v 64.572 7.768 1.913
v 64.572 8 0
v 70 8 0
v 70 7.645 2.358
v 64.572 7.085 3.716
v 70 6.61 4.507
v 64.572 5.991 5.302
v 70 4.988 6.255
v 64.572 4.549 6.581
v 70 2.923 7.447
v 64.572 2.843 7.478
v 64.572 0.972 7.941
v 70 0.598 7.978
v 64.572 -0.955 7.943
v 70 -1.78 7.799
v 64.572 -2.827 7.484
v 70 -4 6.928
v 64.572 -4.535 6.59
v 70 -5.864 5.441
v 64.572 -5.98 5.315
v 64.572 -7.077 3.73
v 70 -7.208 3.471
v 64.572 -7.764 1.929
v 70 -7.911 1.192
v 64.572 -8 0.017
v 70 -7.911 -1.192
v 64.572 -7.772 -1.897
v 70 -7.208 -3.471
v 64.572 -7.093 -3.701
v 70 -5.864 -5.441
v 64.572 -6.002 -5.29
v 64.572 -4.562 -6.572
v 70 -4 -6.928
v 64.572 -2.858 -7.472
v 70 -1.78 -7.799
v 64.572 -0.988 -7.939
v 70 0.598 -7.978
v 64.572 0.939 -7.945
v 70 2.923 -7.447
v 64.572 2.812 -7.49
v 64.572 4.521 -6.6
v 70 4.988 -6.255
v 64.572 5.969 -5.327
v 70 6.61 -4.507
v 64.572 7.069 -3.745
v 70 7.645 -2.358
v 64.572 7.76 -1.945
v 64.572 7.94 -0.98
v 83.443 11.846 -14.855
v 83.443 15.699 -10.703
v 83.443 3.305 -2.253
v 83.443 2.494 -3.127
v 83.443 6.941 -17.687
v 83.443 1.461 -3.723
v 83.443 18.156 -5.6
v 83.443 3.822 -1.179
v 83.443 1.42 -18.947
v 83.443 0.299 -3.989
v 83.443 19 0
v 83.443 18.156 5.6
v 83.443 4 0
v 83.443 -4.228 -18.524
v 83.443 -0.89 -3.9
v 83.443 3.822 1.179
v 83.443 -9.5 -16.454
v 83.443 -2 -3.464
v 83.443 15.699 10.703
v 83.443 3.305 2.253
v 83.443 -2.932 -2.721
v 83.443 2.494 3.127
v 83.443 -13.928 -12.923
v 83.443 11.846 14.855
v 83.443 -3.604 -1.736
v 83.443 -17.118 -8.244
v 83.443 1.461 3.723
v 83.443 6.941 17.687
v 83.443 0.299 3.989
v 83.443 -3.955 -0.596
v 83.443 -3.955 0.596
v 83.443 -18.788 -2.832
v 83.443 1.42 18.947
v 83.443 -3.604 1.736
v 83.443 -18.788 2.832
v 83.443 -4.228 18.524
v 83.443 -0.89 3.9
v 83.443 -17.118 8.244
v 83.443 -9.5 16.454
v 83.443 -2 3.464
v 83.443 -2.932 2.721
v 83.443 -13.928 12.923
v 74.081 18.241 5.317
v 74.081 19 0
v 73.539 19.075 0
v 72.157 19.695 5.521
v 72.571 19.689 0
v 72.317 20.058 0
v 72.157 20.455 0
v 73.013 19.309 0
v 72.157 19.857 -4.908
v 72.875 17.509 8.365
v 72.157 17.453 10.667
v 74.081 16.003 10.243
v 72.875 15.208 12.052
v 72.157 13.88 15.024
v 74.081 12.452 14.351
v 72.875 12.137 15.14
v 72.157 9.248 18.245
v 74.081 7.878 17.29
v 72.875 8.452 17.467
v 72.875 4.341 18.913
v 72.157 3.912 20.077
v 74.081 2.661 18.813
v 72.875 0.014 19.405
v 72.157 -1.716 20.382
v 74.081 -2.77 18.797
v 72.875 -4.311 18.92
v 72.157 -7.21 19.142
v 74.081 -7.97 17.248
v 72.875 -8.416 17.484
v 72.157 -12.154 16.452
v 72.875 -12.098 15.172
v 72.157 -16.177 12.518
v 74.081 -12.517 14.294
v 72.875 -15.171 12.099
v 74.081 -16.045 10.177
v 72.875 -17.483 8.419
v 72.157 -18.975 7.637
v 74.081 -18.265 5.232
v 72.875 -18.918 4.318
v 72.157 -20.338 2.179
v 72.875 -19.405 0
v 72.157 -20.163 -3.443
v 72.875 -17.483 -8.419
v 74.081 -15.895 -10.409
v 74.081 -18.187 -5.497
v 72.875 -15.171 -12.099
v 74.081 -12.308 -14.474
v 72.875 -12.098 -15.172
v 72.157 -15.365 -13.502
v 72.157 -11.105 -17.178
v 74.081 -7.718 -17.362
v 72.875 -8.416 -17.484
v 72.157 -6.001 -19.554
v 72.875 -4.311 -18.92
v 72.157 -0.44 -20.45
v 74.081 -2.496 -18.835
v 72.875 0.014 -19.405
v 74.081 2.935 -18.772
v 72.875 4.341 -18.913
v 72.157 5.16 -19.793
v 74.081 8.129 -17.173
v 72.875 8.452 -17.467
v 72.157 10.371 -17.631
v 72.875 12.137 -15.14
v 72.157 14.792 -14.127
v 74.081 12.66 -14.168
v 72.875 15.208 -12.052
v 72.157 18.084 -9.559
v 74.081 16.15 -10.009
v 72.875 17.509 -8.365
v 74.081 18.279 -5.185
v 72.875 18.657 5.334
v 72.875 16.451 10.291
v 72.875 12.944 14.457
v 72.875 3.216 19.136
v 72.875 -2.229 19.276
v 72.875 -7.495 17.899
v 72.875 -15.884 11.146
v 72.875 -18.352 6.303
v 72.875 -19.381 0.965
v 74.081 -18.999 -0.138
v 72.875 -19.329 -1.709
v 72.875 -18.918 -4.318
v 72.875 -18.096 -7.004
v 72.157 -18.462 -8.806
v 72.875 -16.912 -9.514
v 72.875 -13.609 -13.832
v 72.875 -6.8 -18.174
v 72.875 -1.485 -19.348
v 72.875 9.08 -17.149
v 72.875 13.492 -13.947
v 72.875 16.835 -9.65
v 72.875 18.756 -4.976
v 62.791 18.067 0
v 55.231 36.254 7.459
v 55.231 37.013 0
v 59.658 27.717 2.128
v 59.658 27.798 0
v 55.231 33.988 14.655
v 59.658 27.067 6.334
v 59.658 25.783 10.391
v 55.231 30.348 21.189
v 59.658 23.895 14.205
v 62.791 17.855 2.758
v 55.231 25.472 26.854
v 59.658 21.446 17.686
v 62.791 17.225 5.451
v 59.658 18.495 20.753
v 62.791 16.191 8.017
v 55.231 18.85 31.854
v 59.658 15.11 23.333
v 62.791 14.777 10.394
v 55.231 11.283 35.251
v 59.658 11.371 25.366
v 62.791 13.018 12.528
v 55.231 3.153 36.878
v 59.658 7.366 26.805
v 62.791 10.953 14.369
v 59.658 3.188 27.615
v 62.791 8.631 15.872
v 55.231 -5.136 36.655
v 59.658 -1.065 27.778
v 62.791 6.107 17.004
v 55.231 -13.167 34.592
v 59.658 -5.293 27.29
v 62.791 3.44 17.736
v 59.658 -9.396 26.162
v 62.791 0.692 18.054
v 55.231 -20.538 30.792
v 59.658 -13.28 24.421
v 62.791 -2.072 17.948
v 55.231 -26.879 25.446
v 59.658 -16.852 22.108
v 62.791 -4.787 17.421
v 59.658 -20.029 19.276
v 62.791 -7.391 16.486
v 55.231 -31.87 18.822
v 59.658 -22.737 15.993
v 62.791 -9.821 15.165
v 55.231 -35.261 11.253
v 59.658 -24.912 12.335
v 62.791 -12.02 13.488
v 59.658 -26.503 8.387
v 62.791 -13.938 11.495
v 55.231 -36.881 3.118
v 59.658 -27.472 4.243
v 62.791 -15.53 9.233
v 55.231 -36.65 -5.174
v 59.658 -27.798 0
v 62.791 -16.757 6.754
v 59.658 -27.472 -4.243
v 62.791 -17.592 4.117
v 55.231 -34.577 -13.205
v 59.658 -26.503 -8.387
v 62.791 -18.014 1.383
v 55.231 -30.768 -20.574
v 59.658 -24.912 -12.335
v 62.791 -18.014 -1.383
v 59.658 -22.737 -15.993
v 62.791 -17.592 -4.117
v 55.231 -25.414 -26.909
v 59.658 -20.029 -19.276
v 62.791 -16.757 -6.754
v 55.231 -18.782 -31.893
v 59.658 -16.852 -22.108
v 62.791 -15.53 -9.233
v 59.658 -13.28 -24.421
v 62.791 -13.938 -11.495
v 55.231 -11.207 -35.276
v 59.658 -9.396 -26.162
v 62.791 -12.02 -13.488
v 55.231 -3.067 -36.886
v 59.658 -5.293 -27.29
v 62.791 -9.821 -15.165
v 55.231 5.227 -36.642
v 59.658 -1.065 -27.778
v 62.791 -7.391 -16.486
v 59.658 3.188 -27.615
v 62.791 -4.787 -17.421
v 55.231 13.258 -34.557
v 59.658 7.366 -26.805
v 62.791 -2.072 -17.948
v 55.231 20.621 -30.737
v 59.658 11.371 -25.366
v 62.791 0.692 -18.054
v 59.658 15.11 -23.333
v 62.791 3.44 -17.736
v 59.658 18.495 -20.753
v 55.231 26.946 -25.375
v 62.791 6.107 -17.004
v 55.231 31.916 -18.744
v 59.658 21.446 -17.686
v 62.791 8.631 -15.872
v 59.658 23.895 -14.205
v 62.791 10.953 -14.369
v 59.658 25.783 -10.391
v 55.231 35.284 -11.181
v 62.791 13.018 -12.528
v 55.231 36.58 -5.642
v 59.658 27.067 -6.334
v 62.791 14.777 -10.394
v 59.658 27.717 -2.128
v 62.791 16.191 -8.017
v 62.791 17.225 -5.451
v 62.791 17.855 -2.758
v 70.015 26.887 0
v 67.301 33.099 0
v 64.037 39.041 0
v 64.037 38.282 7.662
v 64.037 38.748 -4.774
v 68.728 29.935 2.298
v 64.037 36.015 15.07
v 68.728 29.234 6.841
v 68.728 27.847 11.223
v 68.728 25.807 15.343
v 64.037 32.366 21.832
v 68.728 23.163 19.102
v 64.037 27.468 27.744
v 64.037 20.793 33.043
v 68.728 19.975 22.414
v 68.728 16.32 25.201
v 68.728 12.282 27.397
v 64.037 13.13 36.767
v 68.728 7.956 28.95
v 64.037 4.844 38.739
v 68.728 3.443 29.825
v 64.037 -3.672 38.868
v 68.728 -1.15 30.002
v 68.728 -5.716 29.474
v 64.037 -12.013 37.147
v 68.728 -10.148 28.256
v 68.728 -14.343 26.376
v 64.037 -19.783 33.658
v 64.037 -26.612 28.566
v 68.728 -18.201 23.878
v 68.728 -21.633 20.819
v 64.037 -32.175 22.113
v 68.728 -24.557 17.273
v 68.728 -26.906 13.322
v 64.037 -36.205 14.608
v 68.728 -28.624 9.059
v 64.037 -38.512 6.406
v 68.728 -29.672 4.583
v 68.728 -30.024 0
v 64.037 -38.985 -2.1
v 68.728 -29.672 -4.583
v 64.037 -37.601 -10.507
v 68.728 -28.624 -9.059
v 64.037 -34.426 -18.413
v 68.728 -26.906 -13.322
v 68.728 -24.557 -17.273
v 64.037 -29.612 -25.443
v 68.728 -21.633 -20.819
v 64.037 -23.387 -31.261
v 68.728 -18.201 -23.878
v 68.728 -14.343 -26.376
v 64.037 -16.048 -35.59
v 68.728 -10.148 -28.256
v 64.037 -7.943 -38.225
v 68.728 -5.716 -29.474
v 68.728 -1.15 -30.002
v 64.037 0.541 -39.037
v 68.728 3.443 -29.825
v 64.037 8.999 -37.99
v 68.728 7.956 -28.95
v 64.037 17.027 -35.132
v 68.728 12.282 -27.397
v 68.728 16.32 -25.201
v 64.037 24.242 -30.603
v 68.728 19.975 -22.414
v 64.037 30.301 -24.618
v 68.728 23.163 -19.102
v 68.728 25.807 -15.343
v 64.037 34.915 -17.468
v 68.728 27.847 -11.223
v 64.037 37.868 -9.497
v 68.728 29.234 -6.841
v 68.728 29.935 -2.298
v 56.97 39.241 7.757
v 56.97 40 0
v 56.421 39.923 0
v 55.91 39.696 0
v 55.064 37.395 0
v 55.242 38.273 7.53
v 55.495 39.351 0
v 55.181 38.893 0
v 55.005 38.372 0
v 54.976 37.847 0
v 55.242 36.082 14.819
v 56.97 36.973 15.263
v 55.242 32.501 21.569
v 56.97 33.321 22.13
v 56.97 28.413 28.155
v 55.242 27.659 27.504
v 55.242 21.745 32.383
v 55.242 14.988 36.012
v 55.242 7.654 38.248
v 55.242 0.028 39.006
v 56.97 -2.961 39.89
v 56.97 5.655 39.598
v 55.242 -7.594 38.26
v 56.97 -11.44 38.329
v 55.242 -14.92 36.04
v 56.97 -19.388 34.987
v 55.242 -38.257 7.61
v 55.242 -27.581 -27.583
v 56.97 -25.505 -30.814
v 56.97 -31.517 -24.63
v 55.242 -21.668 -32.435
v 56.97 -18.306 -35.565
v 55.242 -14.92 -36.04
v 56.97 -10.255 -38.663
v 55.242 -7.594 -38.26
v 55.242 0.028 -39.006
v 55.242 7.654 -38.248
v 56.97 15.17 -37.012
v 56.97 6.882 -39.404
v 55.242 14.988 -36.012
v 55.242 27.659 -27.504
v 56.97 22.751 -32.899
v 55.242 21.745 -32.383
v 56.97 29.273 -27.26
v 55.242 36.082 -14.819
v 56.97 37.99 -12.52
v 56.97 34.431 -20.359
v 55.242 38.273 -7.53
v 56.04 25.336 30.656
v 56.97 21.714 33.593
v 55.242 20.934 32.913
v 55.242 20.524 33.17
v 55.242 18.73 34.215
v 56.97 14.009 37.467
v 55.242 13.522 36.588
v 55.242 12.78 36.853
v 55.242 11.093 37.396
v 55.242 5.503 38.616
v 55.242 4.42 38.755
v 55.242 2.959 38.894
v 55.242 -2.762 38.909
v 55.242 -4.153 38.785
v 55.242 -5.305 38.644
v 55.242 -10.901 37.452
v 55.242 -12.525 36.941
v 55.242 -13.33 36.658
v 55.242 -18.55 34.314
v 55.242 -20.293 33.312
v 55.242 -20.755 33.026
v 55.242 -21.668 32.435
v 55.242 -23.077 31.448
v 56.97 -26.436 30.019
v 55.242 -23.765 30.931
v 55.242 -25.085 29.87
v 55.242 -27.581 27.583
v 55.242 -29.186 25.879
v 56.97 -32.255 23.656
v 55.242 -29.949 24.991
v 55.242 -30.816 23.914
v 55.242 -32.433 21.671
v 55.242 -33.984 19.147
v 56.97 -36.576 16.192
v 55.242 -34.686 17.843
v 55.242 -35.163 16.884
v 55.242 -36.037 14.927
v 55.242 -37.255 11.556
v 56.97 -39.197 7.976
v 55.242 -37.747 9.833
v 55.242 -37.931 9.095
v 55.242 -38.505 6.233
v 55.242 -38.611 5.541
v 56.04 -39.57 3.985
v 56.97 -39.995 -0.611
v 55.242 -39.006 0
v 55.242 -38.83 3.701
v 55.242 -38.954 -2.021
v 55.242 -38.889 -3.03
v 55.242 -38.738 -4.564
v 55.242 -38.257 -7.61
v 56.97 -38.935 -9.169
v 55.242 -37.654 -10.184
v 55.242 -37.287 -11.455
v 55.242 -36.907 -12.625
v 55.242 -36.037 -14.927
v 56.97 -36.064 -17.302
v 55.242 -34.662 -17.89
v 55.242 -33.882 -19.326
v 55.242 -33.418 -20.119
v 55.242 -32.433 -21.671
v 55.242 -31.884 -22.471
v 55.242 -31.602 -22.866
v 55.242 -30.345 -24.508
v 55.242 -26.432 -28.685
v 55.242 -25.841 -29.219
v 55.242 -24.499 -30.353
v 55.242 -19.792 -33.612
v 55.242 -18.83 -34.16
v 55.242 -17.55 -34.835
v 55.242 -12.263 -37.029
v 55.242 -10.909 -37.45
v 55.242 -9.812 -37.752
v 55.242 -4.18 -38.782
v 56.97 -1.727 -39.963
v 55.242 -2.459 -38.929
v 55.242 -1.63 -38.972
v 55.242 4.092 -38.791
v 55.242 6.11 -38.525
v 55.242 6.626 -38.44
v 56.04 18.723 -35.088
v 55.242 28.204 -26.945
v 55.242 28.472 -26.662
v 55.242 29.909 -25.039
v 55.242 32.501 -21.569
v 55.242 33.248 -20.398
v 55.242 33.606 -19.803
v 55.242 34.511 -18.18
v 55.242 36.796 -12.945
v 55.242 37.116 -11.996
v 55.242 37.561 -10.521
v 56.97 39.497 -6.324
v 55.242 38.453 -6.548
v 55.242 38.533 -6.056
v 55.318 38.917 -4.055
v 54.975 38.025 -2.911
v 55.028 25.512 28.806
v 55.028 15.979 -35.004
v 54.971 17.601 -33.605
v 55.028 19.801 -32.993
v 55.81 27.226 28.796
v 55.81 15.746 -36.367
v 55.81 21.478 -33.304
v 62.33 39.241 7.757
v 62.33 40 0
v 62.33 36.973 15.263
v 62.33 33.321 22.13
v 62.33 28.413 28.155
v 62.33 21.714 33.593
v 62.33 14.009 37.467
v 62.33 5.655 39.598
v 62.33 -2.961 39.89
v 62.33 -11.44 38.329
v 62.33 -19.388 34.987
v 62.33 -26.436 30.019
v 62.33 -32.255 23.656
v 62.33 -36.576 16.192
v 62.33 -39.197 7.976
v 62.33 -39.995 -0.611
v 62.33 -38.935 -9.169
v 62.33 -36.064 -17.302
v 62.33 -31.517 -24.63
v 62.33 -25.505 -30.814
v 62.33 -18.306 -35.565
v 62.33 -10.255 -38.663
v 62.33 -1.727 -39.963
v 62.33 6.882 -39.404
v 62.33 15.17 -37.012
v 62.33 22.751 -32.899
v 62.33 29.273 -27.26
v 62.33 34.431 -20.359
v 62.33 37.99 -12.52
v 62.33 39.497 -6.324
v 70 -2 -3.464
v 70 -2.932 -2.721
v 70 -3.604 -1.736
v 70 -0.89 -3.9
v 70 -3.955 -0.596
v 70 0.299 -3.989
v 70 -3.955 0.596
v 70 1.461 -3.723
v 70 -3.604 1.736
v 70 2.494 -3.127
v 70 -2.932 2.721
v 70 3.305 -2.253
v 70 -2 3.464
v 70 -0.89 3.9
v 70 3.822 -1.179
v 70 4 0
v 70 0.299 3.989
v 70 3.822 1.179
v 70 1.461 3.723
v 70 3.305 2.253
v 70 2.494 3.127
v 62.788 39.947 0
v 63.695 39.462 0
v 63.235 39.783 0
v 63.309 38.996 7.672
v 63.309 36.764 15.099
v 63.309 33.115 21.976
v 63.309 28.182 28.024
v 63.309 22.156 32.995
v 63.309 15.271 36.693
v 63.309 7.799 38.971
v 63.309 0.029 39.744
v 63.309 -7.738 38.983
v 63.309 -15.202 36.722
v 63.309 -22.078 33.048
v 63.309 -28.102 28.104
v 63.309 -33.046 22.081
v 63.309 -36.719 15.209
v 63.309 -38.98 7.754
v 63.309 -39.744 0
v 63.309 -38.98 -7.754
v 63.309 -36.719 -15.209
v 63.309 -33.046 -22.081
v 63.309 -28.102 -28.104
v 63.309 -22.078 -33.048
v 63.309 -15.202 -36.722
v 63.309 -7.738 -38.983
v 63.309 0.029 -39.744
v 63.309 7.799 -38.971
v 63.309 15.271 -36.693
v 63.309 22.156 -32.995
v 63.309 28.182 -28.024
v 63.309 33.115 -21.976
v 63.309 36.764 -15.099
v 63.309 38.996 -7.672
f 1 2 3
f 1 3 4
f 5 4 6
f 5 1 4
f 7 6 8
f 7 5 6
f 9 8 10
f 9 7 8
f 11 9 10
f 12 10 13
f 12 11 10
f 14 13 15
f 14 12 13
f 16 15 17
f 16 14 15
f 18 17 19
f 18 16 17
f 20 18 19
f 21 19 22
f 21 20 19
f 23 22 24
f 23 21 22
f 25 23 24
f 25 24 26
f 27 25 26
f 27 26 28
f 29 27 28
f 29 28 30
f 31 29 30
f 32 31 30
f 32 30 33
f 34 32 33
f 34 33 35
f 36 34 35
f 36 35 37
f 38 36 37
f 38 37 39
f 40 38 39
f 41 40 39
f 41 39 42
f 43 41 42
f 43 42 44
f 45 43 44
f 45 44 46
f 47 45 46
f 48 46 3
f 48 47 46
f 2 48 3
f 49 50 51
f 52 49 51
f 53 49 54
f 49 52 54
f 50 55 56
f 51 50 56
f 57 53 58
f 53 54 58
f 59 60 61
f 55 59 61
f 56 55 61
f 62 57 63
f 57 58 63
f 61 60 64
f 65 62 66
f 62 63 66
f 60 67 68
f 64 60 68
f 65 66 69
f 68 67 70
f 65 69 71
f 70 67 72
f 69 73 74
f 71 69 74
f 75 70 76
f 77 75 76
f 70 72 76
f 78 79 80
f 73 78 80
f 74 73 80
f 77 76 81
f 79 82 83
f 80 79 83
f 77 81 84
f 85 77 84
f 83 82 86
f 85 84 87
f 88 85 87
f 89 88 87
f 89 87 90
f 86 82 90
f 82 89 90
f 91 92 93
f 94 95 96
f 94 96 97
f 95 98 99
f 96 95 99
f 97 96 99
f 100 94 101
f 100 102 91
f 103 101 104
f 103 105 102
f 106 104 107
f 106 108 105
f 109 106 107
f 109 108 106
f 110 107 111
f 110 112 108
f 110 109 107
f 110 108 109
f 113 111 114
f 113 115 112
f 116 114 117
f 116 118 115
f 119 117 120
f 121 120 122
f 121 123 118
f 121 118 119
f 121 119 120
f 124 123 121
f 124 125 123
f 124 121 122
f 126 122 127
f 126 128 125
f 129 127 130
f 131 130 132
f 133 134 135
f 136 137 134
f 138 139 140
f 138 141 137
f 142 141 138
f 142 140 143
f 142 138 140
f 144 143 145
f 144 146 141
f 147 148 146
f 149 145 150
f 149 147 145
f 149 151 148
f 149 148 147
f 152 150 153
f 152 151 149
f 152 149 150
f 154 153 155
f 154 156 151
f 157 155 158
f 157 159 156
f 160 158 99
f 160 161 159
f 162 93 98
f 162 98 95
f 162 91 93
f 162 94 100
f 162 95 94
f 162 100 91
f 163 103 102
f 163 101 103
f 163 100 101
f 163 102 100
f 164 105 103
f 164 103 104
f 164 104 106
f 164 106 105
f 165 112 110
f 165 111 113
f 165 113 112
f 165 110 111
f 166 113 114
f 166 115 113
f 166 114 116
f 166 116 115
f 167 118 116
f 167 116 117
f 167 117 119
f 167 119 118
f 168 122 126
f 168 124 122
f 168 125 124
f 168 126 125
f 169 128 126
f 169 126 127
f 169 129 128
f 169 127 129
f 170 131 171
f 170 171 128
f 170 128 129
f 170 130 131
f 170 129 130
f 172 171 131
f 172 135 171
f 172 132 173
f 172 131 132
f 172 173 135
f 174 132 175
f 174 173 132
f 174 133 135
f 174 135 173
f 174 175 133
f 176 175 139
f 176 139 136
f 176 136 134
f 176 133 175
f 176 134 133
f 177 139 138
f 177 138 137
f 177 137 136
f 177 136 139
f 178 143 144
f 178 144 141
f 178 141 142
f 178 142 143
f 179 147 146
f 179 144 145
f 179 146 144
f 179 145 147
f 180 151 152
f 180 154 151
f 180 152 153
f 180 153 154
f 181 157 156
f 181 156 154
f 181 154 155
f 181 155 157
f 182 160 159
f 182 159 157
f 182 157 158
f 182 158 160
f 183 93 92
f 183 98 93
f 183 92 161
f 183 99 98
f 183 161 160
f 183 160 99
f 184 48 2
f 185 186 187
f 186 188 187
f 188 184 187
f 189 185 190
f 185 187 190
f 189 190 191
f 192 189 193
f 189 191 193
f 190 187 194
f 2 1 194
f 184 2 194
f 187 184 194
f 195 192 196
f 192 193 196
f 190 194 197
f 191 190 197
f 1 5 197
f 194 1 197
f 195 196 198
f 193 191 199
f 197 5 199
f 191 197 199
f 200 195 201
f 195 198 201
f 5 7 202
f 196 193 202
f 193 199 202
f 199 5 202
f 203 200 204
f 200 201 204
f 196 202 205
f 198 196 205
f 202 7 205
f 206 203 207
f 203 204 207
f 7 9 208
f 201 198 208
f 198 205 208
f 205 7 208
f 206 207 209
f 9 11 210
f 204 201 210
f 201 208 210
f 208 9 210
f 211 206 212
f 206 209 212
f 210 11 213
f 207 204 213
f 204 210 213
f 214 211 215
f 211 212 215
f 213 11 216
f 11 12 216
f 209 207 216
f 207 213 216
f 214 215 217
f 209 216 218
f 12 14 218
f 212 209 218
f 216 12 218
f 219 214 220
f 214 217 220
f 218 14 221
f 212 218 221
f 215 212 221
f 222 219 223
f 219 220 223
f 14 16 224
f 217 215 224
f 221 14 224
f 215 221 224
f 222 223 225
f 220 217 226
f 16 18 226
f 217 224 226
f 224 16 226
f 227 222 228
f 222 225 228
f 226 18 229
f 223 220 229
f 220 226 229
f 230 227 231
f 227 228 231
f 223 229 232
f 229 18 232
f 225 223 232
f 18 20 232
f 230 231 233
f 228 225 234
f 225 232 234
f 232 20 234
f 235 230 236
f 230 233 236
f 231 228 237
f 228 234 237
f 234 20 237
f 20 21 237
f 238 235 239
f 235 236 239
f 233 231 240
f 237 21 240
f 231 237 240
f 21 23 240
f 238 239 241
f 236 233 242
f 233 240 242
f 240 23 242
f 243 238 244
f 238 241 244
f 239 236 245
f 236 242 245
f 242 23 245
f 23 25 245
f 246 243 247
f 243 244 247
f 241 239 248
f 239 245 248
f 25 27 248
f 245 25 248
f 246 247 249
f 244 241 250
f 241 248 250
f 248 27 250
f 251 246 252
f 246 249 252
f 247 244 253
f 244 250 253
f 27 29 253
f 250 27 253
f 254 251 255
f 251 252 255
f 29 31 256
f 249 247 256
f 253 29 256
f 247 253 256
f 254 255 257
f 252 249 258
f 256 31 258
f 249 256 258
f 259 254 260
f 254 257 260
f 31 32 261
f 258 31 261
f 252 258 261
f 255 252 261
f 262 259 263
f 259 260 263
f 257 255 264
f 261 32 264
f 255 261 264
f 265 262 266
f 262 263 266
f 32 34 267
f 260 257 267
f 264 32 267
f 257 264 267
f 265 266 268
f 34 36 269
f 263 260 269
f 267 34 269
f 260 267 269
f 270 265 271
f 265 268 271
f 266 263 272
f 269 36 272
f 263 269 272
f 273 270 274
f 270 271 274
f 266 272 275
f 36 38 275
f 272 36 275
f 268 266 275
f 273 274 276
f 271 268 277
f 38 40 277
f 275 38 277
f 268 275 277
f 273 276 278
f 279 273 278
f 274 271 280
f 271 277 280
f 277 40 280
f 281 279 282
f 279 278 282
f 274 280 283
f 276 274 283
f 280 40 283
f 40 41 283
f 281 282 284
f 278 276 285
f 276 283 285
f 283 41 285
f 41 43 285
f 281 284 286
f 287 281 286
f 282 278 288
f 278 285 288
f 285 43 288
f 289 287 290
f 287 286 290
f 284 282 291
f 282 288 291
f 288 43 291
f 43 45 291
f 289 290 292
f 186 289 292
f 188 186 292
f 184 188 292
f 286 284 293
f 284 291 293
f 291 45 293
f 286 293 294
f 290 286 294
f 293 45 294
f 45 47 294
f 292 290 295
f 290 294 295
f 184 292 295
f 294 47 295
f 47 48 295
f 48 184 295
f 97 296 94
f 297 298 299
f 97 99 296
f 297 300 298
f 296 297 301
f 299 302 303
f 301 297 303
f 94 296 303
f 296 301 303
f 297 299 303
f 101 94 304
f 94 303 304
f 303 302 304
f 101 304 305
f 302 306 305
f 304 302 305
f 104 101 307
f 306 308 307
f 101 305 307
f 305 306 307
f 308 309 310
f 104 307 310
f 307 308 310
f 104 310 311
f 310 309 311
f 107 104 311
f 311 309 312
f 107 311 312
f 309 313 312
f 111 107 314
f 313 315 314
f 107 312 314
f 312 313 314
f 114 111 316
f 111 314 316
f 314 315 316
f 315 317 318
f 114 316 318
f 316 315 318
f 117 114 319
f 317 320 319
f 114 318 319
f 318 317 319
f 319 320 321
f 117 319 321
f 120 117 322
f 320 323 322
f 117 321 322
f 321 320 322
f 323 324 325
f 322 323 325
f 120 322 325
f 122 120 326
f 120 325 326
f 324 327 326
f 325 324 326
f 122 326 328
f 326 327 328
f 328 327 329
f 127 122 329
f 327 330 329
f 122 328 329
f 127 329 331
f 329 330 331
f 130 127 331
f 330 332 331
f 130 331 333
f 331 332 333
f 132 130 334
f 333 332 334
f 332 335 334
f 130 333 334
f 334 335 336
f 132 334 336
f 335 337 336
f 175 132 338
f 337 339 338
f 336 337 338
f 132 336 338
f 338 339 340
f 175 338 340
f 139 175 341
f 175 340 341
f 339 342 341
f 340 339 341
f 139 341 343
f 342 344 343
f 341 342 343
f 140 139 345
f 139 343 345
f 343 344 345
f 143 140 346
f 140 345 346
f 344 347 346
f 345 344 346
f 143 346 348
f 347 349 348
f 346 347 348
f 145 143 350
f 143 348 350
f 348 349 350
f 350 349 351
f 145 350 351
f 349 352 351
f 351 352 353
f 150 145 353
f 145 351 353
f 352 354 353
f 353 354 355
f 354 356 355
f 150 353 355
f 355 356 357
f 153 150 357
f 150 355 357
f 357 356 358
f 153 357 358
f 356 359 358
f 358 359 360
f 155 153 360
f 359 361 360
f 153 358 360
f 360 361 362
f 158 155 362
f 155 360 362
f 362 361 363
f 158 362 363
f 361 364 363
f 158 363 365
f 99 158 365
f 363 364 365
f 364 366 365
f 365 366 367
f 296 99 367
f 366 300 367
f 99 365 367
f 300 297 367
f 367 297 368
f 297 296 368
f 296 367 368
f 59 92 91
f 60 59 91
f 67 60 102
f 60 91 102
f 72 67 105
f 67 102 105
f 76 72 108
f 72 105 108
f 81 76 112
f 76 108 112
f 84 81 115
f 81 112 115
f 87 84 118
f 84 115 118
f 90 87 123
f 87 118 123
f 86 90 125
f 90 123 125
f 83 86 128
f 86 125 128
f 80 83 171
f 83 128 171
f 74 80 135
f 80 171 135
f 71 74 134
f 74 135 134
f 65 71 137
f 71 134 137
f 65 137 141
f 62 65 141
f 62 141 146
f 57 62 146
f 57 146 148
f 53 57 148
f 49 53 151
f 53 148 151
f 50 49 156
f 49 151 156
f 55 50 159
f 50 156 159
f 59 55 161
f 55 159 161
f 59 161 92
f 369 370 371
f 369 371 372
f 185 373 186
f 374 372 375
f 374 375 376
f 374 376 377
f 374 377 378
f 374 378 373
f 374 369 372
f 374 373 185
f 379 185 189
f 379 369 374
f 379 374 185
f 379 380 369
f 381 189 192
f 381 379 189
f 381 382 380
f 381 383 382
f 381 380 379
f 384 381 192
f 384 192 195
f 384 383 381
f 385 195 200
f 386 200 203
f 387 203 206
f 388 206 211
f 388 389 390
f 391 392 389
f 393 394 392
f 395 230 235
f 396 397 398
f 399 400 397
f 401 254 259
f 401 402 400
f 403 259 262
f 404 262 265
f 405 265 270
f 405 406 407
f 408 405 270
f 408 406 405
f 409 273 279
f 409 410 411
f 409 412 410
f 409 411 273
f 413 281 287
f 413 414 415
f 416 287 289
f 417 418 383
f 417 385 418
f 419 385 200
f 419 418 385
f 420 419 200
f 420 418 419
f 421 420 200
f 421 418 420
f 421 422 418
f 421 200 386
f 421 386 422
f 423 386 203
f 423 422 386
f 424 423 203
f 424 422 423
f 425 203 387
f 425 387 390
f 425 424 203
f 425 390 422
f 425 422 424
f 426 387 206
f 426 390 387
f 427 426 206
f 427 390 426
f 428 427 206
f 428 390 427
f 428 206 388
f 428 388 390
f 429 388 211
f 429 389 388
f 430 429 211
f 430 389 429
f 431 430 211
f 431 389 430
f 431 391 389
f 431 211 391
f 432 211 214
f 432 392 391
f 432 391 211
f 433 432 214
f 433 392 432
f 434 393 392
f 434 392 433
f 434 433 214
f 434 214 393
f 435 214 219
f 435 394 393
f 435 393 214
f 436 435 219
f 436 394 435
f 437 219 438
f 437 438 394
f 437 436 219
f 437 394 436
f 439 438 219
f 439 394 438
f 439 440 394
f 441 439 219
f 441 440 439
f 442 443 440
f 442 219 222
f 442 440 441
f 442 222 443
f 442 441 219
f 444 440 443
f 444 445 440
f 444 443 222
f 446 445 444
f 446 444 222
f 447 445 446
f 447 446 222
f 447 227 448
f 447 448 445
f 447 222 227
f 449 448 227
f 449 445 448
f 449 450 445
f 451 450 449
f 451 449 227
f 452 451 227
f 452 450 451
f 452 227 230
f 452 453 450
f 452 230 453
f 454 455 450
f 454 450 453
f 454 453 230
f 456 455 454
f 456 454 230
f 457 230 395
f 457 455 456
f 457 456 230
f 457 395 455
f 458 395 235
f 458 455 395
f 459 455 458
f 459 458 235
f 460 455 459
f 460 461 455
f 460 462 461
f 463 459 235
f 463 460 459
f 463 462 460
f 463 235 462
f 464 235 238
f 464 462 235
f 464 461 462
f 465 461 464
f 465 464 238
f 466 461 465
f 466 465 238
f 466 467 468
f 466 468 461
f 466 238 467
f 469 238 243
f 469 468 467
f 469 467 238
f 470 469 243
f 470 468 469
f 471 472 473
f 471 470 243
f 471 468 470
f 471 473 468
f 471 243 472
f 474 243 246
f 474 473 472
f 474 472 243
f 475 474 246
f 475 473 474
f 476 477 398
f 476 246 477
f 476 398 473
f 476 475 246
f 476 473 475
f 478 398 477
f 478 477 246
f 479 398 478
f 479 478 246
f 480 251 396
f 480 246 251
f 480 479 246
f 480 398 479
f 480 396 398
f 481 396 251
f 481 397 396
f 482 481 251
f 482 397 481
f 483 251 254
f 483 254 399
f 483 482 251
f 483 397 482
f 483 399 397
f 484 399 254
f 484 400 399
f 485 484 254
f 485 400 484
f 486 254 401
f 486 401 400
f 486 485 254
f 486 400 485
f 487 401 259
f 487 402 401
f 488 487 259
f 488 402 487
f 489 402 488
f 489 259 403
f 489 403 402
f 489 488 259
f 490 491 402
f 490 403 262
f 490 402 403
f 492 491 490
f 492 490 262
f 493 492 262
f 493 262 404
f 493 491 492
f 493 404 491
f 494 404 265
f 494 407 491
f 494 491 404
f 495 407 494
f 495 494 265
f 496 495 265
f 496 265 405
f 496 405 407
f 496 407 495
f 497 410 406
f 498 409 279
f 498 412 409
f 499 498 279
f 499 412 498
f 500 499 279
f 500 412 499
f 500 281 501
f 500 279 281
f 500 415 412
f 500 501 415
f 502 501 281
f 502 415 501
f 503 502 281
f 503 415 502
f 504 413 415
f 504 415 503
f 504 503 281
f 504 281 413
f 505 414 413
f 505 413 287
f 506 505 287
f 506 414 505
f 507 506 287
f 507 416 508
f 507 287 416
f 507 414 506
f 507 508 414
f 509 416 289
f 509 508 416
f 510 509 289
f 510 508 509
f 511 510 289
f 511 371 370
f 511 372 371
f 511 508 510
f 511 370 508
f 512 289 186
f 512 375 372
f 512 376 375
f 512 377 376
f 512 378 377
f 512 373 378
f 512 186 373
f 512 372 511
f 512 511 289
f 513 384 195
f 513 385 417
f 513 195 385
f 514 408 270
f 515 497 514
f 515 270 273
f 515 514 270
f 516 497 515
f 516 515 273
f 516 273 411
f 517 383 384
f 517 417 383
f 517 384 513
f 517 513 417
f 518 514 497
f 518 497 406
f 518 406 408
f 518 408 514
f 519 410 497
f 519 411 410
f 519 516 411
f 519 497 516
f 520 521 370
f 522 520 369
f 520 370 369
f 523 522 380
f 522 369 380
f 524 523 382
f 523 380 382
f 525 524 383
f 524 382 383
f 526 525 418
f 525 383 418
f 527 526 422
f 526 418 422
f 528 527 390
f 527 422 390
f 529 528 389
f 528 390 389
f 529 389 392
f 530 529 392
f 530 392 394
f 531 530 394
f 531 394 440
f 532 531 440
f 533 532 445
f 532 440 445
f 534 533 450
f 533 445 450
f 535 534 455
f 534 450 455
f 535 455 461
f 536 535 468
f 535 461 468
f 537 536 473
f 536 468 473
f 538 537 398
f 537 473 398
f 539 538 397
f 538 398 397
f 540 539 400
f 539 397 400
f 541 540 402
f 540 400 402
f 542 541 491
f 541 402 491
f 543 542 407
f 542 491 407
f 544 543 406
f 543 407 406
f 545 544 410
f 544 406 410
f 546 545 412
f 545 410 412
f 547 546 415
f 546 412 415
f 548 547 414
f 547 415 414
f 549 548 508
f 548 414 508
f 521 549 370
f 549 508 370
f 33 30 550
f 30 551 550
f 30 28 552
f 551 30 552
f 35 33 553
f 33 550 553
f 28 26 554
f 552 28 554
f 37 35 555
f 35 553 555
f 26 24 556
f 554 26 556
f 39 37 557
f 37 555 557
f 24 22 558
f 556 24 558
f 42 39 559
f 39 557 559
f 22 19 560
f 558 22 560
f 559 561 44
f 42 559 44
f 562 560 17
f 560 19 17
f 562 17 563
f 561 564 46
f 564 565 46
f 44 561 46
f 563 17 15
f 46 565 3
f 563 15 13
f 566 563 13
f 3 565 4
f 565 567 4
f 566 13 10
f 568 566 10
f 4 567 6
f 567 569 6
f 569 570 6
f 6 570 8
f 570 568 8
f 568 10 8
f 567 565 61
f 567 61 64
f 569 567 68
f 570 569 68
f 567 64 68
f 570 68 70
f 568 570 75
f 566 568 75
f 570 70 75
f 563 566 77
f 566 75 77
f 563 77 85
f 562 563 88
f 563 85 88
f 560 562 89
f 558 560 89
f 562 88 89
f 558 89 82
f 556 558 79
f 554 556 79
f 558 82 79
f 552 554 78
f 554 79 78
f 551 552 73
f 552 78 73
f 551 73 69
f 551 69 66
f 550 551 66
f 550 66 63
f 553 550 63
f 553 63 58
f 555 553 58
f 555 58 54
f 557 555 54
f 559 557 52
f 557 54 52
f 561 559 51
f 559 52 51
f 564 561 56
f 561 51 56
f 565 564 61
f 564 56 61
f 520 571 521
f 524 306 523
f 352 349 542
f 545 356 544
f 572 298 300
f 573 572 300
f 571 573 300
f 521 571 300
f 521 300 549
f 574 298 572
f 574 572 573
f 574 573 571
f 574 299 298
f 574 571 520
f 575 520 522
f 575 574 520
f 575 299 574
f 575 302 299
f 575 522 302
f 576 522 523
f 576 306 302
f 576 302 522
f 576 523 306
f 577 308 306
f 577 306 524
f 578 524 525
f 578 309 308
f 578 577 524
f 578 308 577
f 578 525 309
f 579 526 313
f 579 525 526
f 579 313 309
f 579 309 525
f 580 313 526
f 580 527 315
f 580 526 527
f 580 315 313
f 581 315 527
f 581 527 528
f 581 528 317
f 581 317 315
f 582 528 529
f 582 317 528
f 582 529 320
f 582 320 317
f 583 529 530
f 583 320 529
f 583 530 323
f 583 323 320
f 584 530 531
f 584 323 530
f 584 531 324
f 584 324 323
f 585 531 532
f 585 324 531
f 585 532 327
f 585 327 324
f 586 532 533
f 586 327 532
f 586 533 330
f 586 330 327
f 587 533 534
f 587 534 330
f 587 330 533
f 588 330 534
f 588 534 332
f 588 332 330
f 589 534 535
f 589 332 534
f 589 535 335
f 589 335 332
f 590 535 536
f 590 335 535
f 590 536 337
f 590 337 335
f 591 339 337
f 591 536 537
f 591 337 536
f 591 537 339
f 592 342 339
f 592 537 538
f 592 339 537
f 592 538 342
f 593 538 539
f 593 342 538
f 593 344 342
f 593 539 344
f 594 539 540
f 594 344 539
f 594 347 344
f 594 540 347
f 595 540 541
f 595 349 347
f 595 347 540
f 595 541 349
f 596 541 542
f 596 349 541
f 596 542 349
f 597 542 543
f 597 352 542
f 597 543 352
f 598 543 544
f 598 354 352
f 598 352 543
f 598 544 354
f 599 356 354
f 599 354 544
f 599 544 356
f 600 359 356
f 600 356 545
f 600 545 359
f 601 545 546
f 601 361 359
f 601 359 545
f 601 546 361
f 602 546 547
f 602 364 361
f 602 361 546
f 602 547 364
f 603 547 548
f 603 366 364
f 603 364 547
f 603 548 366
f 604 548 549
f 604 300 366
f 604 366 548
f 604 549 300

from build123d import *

# Parameters (mm, degrees)
FILLET_1_R          = 2
SKETCH_2_R          = 8
CUT_EXTRUDE_1_DEPTH = 70


with BuildPart() as part:
    # ｽｹｯﾁ1 → 回転1 (revolve)
    with BuildSketch(Plane.XY):
        with BuildLine():
            Line((64.893257373, 4), (83.442887702, 4))
            Line((83.442887702, 4), (83.442887702, 19))
            Line((83.442887702, 19), (72.553428589, 19))
            ThreePointArc((72.553428589, 19), (68.804066095, 29.849631301), (63.442887702, 40))
            Line((63.442887702, 40), (53.442887702, 40))
            ThreePointArc((53.442887702, 40), (61.471828426, 22.732746015), (64.893257373, 4))
        make_face()
    revolve(axis=Axis((-75, 0, 0), (1, 0, 0)))

    # ﾌｨﾚｯﾄ1
    fillet_1_edges = [part.edges().sort_by_distance(p)[0] for p in [
        (72.553428589, -19, 0),
        (53.442887702, -40, 0),
        (63.442887702, -40, 0),
    ]]
    fillet(fillet_1_edges, radius=FILLET_1_R)

    # ｽｹｯﾁ2 → ｶｯﾄ - 押し出し1 (cut)
    with BuildSketch(Plane(origin=(0, 0, 0), x_dir=(0, 0, -1), z_dir=(1, 0, 0))):
        with Locations(Location((0, 0, 0), (0, 0, 90))):
            Circle(SKETCH_2_R)
    extrude(amount=CUT_EXTRUDE_1_DEPTH, mode=Mode.SUBTRACT)


solid = part.part
